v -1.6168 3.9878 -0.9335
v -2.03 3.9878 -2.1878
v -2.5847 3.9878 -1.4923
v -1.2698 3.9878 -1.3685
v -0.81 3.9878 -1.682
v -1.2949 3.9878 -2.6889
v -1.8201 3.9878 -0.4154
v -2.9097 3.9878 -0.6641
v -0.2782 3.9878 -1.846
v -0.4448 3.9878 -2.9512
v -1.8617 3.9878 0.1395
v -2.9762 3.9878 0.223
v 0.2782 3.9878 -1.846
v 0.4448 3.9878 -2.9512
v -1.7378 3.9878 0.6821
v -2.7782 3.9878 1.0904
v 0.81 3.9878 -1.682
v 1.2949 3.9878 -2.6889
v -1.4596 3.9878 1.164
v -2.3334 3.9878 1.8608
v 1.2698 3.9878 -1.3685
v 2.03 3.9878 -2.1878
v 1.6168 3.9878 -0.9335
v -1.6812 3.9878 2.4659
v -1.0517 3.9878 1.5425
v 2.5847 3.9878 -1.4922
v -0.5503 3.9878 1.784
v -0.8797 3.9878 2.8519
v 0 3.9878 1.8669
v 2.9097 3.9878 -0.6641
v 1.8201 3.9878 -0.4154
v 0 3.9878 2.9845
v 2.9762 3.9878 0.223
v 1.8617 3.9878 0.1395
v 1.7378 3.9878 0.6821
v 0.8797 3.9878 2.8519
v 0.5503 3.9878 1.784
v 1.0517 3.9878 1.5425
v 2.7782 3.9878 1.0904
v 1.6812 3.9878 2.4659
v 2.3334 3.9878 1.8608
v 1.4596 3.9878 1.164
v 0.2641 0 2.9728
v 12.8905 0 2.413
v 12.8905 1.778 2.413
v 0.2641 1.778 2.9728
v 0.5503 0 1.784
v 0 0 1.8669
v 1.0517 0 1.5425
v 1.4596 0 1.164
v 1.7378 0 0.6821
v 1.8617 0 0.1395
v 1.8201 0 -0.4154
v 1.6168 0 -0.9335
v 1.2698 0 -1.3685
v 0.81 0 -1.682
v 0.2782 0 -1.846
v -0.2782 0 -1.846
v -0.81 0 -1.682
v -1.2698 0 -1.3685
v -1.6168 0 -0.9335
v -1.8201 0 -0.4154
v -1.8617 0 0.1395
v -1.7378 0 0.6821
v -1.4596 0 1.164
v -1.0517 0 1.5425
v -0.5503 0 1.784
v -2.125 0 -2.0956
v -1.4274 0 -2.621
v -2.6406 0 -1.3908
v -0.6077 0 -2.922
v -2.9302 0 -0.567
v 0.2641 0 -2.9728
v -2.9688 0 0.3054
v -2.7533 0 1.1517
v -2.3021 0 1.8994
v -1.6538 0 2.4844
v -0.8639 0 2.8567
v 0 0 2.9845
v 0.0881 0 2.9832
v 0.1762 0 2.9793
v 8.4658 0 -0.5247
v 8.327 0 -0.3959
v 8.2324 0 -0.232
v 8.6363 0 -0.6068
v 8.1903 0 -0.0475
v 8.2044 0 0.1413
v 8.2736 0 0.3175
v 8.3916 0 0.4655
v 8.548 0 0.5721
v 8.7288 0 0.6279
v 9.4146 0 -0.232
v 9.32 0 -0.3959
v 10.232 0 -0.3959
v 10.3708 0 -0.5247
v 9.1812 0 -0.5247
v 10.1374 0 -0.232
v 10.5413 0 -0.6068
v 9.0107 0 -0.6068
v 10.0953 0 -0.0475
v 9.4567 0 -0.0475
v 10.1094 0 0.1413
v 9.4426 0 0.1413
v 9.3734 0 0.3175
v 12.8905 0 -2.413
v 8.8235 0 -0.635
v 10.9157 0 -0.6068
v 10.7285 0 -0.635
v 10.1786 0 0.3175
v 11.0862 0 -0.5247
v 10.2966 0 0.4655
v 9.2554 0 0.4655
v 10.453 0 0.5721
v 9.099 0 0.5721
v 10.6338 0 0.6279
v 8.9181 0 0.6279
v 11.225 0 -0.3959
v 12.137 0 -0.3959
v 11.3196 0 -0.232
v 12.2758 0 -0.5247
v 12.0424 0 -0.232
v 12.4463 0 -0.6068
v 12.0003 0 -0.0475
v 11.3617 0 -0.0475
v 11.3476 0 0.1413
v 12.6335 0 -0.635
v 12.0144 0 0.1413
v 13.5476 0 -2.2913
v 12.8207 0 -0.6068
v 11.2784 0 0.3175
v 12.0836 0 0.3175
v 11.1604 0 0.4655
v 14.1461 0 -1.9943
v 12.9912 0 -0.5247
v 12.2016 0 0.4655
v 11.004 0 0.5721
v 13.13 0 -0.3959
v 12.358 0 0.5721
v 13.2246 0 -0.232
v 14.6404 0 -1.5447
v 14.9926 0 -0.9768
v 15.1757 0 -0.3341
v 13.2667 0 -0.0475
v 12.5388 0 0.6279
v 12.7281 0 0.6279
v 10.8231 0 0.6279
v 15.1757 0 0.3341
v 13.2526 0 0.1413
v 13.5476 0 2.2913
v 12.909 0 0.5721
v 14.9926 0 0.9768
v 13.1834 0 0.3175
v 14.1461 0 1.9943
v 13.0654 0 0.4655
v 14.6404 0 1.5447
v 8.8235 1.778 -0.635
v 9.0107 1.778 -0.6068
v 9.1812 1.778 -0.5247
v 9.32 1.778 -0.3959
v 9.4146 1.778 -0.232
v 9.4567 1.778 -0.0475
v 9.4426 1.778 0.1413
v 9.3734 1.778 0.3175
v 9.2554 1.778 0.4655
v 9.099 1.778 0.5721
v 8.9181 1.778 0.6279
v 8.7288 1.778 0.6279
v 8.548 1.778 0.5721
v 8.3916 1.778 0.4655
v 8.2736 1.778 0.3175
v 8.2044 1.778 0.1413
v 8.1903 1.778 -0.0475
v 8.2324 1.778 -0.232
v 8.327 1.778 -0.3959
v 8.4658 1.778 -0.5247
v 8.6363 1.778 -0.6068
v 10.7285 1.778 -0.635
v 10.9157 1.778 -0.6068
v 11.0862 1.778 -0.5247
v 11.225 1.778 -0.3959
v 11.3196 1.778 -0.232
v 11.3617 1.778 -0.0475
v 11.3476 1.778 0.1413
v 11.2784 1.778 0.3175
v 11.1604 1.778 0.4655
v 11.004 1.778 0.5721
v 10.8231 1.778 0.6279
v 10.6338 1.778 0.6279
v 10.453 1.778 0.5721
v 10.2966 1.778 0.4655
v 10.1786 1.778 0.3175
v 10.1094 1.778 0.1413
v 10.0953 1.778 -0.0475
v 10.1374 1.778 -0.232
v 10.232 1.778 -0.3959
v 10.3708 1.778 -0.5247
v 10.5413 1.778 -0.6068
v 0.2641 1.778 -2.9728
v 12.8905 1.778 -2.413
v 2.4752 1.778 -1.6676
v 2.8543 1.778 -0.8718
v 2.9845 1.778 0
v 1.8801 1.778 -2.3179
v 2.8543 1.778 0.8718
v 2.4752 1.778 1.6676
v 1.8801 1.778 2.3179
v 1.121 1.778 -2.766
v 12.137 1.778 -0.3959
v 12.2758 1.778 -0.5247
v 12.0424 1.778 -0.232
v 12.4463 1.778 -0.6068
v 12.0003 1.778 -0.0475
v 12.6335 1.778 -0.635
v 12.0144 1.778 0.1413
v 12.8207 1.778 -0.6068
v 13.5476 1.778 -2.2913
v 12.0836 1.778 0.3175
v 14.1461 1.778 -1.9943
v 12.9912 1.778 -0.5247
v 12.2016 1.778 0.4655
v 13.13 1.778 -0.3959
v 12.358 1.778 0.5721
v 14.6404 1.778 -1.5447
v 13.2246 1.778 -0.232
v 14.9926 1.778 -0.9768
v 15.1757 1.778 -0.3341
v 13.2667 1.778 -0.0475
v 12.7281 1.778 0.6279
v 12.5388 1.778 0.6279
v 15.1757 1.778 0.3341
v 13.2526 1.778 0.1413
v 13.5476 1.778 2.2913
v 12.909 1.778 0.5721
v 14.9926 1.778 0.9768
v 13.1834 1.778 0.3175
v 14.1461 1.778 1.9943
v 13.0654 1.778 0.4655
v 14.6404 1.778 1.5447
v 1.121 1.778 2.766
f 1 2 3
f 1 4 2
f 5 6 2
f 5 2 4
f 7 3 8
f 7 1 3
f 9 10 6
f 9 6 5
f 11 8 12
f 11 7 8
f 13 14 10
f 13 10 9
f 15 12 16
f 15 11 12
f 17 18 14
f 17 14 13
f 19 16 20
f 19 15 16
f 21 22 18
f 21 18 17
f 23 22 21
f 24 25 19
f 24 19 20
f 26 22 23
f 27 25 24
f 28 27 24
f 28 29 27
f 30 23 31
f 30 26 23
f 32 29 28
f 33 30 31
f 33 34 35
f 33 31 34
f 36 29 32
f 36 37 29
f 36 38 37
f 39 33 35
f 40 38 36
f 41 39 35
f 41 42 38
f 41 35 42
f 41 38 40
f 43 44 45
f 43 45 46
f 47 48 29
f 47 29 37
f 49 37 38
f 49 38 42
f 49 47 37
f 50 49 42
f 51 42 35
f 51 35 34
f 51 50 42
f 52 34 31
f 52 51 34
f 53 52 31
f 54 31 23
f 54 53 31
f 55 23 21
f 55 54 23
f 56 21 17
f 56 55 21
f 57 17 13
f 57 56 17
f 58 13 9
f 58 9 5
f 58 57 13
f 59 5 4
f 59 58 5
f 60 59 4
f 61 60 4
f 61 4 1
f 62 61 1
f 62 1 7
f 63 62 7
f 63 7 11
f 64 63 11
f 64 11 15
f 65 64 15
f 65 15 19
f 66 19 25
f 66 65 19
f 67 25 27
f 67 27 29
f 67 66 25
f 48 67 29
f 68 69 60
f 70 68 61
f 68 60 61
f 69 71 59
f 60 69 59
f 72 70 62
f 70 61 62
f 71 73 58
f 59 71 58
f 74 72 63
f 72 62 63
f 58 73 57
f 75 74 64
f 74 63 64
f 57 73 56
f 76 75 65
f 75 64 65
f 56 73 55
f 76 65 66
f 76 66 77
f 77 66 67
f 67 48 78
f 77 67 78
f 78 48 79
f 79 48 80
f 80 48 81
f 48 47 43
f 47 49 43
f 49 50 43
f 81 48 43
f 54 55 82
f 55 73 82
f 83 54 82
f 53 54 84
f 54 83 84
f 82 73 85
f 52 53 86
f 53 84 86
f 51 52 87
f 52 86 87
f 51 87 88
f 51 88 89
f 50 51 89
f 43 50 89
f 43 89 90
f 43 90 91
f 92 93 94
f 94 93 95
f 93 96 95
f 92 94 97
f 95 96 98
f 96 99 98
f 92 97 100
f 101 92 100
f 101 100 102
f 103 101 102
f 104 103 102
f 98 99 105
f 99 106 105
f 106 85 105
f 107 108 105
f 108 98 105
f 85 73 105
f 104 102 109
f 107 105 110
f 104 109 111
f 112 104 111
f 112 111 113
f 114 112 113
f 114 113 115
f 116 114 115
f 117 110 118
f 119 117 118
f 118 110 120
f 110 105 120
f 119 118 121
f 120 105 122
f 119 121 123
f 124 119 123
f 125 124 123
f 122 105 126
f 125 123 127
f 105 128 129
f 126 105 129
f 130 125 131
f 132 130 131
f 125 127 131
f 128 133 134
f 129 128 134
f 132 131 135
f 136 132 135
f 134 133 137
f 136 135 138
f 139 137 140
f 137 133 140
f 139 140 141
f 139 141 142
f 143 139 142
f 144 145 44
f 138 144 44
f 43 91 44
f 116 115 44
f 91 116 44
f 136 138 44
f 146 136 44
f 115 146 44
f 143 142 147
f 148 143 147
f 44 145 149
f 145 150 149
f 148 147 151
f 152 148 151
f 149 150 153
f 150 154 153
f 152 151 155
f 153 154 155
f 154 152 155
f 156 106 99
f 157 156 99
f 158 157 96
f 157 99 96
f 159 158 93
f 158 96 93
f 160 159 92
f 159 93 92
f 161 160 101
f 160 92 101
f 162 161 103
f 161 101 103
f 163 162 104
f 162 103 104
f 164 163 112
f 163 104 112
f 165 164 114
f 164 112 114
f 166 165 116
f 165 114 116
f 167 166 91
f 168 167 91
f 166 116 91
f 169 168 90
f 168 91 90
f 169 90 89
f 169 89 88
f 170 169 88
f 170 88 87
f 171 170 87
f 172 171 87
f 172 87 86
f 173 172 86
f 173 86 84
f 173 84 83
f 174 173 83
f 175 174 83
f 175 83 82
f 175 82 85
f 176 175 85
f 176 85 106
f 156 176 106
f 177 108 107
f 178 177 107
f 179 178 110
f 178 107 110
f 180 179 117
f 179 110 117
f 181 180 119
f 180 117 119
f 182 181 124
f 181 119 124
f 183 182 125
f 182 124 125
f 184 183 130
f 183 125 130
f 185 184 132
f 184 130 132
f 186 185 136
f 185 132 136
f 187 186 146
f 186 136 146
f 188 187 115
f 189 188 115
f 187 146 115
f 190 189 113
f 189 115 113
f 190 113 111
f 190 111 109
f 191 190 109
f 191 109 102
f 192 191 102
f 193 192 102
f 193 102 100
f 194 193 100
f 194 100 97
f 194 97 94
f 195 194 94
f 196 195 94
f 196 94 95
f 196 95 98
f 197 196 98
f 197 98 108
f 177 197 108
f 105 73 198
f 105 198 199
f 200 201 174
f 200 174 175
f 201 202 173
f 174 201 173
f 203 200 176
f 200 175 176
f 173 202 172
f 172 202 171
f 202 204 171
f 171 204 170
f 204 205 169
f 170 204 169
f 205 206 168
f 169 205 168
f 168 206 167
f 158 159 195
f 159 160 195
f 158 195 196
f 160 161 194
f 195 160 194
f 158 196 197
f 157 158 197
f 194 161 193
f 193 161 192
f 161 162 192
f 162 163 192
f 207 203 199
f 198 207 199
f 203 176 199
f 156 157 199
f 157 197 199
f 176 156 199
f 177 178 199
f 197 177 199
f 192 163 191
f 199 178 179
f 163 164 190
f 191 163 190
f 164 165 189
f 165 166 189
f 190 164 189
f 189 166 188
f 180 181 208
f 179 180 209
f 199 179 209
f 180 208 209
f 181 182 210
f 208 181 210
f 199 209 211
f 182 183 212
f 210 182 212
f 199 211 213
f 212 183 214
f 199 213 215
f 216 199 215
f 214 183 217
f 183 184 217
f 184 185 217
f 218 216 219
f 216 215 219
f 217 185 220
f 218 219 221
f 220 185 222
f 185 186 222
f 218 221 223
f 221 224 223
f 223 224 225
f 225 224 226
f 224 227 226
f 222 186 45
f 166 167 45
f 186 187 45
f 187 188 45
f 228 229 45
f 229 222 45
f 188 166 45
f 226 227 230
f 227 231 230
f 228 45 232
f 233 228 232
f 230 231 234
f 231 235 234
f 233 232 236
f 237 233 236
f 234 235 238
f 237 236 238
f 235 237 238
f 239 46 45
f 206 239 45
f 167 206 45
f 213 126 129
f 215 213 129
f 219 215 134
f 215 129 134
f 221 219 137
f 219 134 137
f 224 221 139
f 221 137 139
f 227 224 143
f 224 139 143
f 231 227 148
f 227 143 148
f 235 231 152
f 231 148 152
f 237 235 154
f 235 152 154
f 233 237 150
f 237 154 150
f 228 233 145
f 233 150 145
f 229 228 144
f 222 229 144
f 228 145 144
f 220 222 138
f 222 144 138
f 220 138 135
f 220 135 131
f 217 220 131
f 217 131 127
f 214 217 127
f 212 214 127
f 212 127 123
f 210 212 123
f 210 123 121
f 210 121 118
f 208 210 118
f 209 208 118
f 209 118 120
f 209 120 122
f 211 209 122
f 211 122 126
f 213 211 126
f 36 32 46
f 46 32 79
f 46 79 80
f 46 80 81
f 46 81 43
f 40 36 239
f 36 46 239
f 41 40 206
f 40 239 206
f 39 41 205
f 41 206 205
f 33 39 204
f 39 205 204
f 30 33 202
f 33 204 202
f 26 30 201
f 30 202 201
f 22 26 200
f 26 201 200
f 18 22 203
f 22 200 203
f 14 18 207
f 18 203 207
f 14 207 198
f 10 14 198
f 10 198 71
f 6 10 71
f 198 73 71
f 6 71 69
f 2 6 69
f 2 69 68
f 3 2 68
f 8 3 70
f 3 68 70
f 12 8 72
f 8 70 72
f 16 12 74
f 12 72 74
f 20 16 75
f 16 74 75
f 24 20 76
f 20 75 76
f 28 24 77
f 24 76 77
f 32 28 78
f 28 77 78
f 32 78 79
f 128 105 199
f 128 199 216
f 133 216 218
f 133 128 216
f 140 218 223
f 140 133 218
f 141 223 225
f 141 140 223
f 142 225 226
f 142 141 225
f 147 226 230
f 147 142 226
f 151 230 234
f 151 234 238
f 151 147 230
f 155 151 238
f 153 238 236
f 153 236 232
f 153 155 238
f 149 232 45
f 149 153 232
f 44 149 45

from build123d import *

# Parameters (mm, degrees)
SKETCH1_R           = 2.9845
SKETCH1_R_2         = 1.8669
BOSS_EXTRUDE1_DEPTH = 3.9878
BOSS_EXTRUDE2_DEPTH = 1.778
SKETCH3_R           = 0.635
CUT_EXTRUDE1_DEPTH  = 16.994250438


with BuildPart() as part:
    # Sketch1 → Boss-Extrude1 (new body)
    with BuildSketch(Plane(origin=(0, 0, 0), x_dir=(1, 0, 0), z_dir=(0, 1, 0))):
        with Locations(Location((0, 0, 0), (0, 0, 270))):
            Circle(SKETCH1_R)
        with Locations(Location((0, 0, 0), (0, 0, 270))):
            Circle(SKETCH1_R_2, mode=Mode.SUBTRACT)
    extrude(amount=BOSS_EXTRUDE1_DEPTH)

    # Sketch2 → Boss-Extrude2 (add)
    with BuildSketch(Plane.XZ):
        with BuildLine():
            Line((12.8905, 2.413), (0.264116324, 2.972790409))
            ThreePointArc((0.264116324, 2.972790409), (2.201760139, 2.01481824), (2.9845, 0))
            ThreePointArc((2.9845, 0), (2.201760139, -2.01481824), (0.264116324, -2.972790409))
            Line((0.264116324, -2.972790409), (12.8905, -2.413))
            ThreePointArc((12.8905, -2.413), (15.198890025, 0), (12.8905, 2.413))
        make_face()
    extrude(amount=-BOSS_EXTRUDE2_DEPTH)

    # Sketch3 → Cut-Extrude1 (cut, through all)
    with BuildSketch(Plane.XZ):
        with Locations(Location((8.823490025, 0, 0), (0, 0, 270))):
            Circle(SKETCH3_R)
        with Locations(Location((10.728490025, 0, 0), (0, 0, 270))):
            Circle(SKETCH3_R)
        with Locations(Location((12.633490025, 0, 0), (0, 0, 270))):
            Circle(SKETCH3_R)
    extrude(amount=-CUT_EXTRUDE1_DEPTH, mode=Mode.SUBTRACT)


solid = part.part
